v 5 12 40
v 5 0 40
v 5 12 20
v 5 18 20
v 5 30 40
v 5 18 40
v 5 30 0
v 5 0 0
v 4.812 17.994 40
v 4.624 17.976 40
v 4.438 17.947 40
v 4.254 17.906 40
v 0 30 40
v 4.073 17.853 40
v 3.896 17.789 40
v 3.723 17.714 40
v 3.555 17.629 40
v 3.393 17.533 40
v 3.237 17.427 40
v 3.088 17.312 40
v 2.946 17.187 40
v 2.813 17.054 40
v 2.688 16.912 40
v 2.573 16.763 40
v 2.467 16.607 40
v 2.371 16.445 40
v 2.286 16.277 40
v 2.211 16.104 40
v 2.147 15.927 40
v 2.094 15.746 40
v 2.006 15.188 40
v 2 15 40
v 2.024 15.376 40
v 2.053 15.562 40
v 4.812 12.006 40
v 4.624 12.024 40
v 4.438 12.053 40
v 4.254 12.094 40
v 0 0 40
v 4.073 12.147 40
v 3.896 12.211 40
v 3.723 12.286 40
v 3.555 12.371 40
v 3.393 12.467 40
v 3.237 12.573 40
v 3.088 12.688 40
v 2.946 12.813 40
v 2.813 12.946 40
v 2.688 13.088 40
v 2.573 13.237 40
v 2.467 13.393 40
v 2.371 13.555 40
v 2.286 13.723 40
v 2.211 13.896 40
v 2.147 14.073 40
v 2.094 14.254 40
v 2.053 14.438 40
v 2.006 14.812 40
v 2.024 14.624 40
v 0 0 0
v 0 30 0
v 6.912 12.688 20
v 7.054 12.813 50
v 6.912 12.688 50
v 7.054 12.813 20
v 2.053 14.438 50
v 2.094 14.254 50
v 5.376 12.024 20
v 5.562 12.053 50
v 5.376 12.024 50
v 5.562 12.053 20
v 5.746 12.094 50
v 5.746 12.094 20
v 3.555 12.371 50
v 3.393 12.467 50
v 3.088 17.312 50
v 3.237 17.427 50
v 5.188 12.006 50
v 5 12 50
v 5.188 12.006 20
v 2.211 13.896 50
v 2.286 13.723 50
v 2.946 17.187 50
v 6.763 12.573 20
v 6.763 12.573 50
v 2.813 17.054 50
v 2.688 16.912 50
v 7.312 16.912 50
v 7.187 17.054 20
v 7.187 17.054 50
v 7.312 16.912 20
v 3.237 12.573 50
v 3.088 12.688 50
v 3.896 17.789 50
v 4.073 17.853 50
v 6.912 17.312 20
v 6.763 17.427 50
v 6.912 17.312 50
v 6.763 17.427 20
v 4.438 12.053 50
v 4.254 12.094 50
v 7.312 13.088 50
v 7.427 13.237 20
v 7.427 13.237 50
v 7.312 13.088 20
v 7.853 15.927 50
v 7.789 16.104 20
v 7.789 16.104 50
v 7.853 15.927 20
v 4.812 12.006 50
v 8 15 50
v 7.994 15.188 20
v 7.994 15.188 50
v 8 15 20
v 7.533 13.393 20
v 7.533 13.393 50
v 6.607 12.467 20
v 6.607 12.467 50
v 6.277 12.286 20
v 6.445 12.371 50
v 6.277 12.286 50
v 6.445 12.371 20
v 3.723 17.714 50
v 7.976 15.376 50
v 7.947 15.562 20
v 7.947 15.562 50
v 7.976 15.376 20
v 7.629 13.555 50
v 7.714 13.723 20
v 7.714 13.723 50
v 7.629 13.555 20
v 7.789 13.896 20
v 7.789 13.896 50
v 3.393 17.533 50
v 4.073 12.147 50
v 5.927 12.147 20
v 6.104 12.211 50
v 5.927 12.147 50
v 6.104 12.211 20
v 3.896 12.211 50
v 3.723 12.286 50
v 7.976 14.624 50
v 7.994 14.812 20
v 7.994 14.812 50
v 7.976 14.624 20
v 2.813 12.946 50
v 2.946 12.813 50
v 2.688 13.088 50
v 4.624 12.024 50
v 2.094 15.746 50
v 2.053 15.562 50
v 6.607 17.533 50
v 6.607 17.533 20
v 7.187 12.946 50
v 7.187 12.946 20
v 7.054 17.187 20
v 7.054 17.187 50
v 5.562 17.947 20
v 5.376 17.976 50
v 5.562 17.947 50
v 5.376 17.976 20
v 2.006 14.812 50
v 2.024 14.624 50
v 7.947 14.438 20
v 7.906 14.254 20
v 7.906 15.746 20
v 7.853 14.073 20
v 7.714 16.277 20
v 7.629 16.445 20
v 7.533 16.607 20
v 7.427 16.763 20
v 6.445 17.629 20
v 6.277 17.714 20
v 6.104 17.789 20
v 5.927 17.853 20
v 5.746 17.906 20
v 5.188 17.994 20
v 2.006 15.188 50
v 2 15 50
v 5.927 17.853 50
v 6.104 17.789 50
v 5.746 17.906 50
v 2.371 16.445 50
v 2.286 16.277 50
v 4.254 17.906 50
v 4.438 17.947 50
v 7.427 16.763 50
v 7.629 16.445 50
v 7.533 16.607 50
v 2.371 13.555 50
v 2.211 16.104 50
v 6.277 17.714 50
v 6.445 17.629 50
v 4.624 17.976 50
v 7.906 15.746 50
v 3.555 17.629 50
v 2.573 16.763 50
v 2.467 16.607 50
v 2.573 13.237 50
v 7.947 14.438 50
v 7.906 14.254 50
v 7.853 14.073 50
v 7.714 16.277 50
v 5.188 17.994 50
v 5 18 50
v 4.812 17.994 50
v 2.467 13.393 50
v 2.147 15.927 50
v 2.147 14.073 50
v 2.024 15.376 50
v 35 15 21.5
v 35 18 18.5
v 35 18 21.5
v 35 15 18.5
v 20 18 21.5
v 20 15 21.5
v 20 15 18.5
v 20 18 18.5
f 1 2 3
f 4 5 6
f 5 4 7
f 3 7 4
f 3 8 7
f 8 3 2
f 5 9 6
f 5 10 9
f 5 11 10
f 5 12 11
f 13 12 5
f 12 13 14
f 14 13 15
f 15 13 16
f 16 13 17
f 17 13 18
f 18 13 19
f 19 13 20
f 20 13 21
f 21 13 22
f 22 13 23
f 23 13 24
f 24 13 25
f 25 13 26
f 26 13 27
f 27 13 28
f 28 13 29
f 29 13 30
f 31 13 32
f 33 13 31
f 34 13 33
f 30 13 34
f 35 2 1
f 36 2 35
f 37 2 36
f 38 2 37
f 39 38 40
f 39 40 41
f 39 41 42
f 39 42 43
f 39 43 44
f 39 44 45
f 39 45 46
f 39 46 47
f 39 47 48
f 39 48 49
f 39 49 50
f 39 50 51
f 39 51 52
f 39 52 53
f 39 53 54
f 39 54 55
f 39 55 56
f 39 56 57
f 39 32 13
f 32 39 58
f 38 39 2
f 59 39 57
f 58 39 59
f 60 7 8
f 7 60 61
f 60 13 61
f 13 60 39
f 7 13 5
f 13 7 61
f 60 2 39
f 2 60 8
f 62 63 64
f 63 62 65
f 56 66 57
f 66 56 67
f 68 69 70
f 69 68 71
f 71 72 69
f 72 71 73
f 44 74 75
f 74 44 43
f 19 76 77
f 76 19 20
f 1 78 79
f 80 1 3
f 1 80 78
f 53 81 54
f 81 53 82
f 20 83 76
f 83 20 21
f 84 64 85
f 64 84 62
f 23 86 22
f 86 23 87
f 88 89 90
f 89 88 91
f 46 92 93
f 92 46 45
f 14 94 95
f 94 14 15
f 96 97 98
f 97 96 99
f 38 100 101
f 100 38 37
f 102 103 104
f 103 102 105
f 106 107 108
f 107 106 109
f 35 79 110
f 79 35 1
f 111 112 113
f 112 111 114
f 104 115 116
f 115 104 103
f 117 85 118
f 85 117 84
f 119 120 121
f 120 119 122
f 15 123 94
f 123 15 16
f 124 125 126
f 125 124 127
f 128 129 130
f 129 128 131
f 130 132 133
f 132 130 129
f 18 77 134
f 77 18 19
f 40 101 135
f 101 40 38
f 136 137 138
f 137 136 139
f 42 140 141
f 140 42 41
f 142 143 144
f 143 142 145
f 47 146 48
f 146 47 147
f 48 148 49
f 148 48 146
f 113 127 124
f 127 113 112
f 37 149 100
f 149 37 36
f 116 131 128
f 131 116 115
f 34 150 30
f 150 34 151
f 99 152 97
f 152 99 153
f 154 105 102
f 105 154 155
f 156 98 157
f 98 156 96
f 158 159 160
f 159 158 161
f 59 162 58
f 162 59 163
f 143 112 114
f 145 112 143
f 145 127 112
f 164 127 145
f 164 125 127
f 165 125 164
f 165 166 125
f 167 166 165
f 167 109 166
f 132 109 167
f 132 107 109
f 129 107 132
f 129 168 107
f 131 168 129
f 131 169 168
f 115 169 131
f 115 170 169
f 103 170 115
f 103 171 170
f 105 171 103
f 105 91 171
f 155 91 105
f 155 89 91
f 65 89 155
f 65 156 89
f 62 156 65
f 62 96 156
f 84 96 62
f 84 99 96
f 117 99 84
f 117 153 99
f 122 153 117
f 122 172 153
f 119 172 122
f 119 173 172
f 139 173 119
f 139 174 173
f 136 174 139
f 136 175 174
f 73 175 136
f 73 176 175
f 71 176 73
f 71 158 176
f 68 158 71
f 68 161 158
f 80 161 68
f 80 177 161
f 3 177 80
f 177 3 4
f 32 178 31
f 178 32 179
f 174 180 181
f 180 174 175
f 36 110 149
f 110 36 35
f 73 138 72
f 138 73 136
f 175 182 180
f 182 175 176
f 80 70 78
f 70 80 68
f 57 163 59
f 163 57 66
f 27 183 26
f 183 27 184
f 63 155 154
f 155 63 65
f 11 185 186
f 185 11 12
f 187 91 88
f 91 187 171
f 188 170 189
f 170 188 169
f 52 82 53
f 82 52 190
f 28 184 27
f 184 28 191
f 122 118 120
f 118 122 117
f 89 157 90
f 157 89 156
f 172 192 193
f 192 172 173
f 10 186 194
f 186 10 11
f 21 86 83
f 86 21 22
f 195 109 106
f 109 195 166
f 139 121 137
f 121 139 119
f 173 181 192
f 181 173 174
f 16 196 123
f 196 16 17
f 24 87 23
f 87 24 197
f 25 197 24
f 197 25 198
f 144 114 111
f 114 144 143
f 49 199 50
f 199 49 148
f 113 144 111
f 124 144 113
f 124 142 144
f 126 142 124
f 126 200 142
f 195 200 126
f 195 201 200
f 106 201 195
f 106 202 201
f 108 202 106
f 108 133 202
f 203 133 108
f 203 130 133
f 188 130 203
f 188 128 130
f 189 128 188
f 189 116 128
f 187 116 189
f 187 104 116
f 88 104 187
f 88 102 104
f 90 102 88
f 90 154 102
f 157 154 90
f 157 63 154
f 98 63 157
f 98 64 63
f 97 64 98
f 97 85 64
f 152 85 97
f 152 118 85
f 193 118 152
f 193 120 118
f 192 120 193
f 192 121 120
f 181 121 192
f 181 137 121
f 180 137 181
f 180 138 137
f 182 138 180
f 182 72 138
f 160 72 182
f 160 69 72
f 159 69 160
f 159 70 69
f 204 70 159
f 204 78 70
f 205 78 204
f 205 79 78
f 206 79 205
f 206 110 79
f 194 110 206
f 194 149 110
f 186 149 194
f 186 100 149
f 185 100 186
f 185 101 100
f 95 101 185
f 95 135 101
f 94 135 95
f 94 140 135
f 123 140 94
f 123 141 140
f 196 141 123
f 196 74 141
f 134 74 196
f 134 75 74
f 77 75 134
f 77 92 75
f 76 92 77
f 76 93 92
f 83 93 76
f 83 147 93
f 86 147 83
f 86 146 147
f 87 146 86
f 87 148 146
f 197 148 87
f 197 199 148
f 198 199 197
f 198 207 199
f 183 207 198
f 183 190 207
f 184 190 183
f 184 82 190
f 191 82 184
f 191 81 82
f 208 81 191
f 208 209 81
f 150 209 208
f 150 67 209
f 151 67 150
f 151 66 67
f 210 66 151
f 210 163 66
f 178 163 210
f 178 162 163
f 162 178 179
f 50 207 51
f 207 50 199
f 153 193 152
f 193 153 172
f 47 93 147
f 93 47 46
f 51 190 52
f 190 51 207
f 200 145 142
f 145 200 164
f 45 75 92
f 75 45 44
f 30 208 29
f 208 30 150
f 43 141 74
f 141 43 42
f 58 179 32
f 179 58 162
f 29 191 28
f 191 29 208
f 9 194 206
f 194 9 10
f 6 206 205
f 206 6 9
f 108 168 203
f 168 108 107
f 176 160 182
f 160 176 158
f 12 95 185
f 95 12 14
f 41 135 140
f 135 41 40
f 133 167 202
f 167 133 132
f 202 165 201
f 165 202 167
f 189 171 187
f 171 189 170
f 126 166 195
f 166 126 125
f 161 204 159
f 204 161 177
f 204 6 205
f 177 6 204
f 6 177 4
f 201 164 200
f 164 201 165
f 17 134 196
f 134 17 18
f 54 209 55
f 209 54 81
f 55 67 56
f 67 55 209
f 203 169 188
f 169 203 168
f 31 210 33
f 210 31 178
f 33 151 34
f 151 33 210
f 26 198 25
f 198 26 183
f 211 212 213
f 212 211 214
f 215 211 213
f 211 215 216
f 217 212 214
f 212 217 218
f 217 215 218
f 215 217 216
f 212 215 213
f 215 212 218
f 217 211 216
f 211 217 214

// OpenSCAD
// Parameters
wall_thickness = 5; // The thickness of the base that attaches to the wall
hook_thickness = 3; // The thickness of the hook
hook_radius = 15;   // The radius of the hook
height = 40;        // The height of the hook

// Base of the hook
cube([ wall_thickness, hook_radius * 2, height ]);

// Curved part of the hook
translate([ wall_thickness, hook_radius, height / 2 ]) rotate([ 0, 0, -90 ])
    cylinder(r = hook_thickness, h = hook_radius * 2, $fn = 100);

// Straight part of the hook
translate([ wall_thickness + hook_radius, hook_radius, height / 2 - hook_thickness / 2 ])
    cube([ hook_radius, hook_thickness, hook_thickness ]);
